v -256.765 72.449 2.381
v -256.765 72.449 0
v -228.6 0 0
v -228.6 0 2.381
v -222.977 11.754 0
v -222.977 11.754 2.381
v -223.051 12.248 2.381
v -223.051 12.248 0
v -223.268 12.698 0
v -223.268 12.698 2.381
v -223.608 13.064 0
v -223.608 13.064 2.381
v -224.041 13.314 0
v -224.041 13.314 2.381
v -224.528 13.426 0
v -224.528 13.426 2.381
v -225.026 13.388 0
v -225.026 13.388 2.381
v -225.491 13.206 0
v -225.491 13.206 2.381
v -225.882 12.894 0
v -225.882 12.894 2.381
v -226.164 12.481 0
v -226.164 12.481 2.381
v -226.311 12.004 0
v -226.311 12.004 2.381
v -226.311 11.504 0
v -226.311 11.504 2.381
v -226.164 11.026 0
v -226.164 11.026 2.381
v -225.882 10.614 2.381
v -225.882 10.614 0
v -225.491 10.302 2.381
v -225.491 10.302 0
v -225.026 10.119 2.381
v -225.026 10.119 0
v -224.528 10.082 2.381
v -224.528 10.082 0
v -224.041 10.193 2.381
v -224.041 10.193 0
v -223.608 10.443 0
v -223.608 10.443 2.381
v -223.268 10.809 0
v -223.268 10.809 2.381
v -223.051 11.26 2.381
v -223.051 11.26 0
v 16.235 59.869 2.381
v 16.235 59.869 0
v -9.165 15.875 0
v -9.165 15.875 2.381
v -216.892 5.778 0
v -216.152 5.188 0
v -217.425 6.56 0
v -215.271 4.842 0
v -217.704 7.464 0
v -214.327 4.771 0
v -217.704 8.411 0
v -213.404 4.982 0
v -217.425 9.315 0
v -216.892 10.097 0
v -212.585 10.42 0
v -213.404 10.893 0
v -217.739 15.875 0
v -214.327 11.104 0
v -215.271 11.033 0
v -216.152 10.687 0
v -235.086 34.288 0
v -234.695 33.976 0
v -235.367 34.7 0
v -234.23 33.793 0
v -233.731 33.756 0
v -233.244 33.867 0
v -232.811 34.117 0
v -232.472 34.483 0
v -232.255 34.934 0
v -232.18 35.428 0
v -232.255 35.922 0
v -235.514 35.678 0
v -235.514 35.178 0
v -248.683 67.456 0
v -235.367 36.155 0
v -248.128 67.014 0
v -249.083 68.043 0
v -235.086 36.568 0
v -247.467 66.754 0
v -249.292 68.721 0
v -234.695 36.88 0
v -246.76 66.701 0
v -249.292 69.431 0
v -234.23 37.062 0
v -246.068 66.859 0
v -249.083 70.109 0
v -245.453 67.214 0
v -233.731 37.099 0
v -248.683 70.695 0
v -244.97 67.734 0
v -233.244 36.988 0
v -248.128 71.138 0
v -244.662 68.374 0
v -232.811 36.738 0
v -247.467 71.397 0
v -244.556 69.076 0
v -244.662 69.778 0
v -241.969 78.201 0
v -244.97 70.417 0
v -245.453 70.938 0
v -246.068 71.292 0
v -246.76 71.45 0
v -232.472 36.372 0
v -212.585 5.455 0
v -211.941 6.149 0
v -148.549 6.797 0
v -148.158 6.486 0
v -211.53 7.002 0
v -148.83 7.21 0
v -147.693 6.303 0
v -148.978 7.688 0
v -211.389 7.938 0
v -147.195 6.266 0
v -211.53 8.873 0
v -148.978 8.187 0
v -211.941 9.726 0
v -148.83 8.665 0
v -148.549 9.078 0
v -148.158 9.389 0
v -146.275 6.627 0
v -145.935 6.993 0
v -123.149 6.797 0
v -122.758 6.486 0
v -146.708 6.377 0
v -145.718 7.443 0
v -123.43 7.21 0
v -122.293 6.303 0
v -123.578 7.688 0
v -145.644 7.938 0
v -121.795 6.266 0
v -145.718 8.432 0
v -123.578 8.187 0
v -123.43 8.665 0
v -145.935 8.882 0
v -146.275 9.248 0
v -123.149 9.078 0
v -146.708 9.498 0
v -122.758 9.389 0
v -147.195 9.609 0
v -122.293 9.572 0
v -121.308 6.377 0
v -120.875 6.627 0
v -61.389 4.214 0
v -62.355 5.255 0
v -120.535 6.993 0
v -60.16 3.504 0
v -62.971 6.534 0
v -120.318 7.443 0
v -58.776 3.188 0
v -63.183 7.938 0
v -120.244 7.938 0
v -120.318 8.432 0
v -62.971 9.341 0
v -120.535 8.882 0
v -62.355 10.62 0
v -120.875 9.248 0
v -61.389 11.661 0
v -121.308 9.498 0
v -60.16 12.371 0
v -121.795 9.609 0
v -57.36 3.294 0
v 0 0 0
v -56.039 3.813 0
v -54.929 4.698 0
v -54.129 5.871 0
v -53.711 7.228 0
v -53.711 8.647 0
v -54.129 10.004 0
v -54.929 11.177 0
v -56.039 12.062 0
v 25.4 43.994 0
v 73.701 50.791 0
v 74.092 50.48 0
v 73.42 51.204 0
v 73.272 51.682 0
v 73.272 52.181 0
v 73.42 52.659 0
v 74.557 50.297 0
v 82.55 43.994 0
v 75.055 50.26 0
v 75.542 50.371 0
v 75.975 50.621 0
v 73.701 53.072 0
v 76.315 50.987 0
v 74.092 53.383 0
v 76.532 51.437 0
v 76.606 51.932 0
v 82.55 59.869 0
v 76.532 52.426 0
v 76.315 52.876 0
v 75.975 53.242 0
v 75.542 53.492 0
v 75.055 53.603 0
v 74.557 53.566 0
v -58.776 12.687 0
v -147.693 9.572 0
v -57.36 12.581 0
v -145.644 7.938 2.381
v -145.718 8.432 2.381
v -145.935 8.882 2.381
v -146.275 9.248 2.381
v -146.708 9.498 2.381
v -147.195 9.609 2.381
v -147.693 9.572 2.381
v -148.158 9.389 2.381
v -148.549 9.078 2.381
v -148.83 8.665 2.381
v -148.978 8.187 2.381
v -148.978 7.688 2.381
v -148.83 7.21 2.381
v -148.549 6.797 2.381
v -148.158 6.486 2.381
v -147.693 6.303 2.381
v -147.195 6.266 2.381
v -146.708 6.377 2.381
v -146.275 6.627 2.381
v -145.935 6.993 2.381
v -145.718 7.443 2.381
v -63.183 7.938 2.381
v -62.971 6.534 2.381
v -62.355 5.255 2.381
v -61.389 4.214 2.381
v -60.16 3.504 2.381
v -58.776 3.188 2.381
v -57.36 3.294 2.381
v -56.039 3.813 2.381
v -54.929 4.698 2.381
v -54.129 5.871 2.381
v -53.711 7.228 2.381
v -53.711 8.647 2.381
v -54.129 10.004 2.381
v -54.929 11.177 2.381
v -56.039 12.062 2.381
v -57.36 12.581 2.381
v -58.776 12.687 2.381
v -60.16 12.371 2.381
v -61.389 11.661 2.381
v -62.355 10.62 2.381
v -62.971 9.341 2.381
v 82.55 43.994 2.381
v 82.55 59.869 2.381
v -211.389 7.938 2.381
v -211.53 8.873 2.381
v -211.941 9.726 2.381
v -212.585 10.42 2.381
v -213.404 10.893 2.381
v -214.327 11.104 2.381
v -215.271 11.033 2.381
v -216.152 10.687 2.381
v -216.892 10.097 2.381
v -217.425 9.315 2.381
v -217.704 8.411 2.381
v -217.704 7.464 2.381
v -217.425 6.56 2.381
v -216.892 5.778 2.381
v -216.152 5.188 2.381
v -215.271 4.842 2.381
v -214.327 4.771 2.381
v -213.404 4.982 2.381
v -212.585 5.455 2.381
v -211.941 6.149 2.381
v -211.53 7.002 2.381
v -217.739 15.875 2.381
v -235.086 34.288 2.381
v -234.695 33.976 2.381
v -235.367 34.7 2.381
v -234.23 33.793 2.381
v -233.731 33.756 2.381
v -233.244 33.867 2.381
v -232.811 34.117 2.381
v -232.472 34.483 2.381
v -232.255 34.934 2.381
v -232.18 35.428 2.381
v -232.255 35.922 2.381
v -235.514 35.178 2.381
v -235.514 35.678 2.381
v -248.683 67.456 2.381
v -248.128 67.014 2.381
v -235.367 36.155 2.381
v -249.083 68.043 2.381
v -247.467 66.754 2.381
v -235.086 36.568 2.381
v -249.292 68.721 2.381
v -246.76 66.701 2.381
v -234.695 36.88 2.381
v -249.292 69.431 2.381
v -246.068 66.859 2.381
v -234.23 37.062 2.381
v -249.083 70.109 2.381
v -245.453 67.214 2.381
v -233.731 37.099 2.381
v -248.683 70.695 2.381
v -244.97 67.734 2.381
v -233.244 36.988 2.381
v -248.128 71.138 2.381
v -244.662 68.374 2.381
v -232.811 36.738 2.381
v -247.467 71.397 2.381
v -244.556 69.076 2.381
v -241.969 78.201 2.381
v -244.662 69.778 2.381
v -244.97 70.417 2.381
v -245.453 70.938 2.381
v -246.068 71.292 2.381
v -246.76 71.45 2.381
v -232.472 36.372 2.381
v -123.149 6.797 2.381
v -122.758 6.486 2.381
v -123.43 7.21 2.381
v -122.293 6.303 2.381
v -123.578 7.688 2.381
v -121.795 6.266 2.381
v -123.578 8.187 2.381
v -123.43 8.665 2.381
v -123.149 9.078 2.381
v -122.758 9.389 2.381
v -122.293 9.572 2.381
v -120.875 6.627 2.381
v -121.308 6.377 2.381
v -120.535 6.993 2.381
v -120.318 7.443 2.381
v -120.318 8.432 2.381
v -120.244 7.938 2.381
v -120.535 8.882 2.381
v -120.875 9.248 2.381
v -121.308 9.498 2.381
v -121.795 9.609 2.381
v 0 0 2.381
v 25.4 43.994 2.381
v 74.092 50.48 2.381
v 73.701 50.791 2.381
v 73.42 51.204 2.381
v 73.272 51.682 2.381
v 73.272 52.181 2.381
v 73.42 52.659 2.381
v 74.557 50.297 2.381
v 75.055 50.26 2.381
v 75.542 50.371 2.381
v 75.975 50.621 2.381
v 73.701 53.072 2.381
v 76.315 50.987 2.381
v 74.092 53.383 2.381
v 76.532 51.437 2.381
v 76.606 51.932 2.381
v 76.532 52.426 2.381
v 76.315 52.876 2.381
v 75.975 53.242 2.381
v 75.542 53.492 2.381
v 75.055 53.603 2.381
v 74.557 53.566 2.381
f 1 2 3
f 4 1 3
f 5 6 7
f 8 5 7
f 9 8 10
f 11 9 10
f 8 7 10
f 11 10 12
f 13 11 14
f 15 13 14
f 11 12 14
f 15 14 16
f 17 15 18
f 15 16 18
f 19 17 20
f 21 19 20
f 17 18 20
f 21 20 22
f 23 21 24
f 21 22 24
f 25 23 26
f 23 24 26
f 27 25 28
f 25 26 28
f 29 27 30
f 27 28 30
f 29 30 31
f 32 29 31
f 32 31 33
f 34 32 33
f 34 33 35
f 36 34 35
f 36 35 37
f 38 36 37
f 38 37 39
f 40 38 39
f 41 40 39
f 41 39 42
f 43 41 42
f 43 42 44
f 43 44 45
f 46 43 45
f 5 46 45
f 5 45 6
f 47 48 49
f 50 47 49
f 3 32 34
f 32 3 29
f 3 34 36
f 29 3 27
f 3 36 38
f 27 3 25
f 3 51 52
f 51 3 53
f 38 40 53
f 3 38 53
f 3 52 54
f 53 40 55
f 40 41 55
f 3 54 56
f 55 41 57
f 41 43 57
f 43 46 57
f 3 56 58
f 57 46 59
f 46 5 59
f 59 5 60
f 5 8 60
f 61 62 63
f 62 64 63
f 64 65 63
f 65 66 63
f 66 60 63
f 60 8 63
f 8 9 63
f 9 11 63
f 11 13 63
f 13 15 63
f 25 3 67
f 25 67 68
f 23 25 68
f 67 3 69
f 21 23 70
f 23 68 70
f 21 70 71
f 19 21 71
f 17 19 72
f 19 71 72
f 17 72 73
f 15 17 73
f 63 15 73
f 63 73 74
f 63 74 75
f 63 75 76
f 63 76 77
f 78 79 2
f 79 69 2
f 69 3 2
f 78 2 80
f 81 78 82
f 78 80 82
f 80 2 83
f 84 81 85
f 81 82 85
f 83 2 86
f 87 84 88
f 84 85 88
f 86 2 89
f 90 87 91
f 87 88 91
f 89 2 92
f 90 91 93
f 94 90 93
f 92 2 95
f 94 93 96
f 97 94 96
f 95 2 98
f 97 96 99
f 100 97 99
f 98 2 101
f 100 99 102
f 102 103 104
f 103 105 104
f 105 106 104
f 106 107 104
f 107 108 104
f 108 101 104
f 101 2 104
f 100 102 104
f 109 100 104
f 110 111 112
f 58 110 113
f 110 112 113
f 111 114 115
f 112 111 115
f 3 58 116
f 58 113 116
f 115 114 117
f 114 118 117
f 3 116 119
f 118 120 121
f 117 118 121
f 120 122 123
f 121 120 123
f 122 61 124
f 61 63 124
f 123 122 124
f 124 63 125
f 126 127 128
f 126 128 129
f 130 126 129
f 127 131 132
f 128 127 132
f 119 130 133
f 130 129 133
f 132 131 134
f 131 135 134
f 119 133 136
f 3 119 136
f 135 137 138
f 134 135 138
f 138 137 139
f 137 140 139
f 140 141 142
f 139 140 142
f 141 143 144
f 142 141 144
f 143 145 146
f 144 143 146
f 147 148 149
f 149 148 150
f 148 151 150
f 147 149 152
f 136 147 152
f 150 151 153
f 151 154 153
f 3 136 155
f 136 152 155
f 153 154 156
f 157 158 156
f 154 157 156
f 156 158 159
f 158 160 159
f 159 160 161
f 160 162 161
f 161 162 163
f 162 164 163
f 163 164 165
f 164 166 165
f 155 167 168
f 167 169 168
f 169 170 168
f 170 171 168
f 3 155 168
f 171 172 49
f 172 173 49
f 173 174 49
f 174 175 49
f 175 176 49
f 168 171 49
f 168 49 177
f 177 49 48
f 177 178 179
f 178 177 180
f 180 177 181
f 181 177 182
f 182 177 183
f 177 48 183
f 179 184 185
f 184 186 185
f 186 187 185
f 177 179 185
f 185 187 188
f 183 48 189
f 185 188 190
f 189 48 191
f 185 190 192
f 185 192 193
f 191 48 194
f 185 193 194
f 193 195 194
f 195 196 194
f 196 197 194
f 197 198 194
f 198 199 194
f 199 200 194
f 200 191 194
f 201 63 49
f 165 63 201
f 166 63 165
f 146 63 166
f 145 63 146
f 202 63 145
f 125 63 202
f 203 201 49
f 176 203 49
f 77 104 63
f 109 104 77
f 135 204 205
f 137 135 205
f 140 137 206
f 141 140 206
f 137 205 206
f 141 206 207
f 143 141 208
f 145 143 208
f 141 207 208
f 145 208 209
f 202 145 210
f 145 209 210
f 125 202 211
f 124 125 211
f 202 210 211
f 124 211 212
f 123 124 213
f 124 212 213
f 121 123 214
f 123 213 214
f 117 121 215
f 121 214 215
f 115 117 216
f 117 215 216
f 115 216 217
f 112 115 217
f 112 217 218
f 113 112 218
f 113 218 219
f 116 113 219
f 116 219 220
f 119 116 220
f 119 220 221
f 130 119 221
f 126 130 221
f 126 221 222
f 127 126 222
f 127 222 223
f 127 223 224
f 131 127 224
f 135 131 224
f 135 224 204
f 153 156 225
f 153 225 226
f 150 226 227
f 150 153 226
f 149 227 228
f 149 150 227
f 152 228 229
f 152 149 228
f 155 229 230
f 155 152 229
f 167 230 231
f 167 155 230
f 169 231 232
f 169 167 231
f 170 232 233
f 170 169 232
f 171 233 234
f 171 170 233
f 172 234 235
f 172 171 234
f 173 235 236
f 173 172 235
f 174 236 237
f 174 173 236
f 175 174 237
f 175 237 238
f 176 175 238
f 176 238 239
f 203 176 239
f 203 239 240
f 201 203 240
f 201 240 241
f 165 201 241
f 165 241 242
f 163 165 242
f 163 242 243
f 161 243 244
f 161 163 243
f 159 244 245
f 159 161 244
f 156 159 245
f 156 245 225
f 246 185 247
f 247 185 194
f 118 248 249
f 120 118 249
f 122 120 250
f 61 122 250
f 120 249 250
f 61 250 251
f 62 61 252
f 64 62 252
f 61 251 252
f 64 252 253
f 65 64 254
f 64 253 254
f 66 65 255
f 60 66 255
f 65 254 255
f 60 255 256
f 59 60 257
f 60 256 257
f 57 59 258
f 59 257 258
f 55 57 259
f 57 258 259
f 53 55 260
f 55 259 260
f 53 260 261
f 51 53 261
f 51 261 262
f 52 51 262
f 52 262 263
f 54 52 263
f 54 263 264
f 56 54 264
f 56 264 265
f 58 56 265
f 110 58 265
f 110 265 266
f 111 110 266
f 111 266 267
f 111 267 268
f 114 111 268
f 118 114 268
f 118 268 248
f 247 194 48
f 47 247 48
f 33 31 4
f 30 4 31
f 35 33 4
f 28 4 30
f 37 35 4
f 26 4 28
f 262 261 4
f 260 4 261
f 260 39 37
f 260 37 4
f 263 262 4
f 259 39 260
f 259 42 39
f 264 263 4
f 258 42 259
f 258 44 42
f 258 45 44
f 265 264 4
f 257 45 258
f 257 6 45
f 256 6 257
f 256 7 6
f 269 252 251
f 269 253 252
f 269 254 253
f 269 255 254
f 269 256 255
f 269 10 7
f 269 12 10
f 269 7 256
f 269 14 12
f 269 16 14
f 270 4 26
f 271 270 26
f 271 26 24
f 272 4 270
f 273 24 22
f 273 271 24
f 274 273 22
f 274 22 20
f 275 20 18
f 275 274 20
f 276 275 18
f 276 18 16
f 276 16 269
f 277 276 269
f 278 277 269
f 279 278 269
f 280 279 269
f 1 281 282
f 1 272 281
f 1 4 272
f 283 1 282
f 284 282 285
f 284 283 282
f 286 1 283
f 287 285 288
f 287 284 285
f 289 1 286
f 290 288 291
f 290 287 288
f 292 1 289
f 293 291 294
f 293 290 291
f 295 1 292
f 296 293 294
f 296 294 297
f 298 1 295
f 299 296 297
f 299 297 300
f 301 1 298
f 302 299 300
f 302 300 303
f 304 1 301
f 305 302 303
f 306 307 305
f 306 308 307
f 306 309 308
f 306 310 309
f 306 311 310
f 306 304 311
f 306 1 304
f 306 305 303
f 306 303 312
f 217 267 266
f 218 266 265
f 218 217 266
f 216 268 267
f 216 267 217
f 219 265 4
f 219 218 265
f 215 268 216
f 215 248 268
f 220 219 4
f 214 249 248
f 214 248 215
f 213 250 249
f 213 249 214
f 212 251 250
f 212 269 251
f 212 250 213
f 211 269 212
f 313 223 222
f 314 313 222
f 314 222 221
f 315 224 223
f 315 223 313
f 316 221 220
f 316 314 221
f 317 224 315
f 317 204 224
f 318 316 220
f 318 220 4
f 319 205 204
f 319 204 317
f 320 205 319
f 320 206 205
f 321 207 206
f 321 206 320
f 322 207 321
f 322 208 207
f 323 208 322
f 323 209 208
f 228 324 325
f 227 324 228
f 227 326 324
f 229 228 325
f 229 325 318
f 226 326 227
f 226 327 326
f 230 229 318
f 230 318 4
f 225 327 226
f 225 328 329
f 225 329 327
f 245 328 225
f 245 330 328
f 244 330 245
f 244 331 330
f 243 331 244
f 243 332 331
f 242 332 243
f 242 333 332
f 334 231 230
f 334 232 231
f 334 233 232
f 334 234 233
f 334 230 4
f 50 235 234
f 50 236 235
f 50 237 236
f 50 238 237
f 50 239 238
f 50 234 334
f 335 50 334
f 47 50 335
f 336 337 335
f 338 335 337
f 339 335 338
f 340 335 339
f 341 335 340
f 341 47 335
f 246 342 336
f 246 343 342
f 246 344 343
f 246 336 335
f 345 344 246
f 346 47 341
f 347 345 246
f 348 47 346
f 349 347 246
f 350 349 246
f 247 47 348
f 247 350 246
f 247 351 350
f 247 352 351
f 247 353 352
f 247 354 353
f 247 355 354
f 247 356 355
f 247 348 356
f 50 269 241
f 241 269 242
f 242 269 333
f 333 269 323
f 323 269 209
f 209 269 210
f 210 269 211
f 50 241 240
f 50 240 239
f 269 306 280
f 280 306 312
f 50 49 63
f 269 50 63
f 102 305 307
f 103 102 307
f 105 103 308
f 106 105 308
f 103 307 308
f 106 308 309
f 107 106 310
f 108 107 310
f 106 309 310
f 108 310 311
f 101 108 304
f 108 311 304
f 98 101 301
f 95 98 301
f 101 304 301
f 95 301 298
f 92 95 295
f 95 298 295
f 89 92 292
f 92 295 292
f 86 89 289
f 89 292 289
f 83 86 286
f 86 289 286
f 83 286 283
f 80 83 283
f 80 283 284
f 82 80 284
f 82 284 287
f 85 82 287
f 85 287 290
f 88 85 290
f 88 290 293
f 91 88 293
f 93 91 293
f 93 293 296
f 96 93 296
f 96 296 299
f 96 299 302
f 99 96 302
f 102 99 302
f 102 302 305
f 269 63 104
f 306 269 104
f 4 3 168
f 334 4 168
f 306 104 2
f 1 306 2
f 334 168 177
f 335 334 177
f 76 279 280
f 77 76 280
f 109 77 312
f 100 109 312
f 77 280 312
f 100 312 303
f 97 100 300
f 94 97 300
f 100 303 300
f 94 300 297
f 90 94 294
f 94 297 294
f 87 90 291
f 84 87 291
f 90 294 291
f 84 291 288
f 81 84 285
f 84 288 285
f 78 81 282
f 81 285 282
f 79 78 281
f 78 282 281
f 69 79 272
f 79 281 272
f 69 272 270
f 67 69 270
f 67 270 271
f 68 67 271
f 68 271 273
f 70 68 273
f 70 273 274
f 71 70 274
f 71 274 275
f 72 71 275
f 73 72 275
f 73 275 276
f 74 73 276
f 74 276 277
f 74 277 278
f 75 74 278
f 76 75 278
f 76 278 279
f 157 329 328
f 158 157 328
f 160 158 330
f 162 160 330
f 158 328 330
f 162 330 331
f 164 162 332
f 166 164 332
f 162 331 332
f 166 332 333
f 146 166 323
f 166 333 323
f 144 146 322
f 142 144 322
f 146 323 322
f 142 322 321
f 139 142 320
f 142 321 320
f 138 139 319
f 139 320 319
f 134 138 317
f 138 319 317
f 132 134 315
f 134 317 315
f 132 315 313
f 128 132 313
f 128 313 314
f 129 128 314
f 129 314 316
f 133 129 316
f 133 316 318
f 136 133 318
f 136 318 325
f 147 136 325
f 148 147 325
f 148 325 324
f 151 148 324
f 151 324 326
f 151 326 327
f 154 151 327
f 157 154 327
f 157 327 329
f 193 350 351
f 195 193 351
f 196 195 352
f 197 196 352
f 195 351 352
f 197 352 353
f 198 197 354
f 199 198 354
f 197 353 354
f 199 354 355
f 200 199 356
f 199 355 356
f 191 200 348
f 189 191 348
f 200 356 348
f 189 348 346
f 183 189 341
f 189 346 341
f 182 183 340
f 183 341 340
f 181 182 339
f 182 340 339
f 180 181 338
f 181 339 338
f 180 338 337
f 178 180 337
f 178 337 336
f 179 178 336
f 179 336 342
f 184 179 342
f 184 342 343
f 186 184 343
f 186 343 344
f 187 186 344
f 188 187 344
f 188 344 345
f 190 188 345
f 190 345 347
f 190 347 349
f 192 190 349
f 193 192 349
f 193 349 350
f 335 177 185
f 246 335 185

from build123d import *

# Parameters (mm, degrees)
SKETCH1_R           = 4.7625
BOSS_EXTRUDE1_DEPTH = 2.38125
SKETCH4_R           = 1.6764
SKETCH4_R_2         = 2.38125
CUT_EXTRUDE2_DEPTH  = 269.420180625
SKETCH5_R           = 1.6764
CUT_EXTRUDE3_DEPTH  = 269.420180625
SKETCH6_R           = 3.175
CUT_EXTRUDE4_DEPTH  = 269.420180625


with BuildPart() as part:
    # Sketch1 → Boss-Extrude1 (new body)
    with BuildSketch(Plane.XY):
        Polygon((0, 0), (25.4, 43.994090512), (82.55, 43.994090512), (82.55, 59.869090512), (16.234564477, 59.869090512), (-9.165435523, 15.875), (-217.739113558, 15.875), (-241.968881923, 78.201036741), (-256.765108354, 72.448879893), (-228.6, 0), align=None)
        with Locations(Location((-58.42, 7.9375, 0), (0, 0, 180))):
            Circle(SKETCH1_R, mode=Mode.SUBTRACT)
    extrude(amount=BOSS_EXTRUDE1_DEPTH)

    # Sketch4 → Cut-Extrude2 (cut, through all)
    with BuildSketch(Plane.XY.offset(2.38125)):
        with Locations((74.93, 51.931590512)):
            Circle(SKETCH4_R)
        with Locations((-246.937589356, 69.075817516)):
            Circle(SKETCH4_R_2)
    extrude(amount=-CUT_EXTRUDE2_DEPTH, mode=Mode.SUBTRACT)

    # Sketch5 → Cut-Extrude3 (cut, through all)
    with BuildSketch(Plane.XY.offset(2.38125)):
        with Locations((-147.32, 7.9375)):
            Circle(SKETCH5_R)
        with Locations((-121.92, 7.9375)):
            Circle(SKETCH5_R)
        with Locations((-224.653180894, 11.753814283)):
            Circle(SKETCH5_R)
        with Locations((-233.856631852, 35.427776572)):
            Circle(SKETCH5_R)
    extrude(amount=-CUT_EXTRUDE3_DEPTH, mode=Mode.SUBTRACT)

    # Sketch6 → Cut-Extrude4 (cut, through all)
    with BuildSketch(Plane.XY.offset(2.38125)):
        with Locations((-214.564113558, 7.9375)):
            Circle(SKETCH6_R)
    extrude(amount=-CUT_EXTRUDE4_DEPTH, mode=Mode.SUBTRACT)


solid = part.part
